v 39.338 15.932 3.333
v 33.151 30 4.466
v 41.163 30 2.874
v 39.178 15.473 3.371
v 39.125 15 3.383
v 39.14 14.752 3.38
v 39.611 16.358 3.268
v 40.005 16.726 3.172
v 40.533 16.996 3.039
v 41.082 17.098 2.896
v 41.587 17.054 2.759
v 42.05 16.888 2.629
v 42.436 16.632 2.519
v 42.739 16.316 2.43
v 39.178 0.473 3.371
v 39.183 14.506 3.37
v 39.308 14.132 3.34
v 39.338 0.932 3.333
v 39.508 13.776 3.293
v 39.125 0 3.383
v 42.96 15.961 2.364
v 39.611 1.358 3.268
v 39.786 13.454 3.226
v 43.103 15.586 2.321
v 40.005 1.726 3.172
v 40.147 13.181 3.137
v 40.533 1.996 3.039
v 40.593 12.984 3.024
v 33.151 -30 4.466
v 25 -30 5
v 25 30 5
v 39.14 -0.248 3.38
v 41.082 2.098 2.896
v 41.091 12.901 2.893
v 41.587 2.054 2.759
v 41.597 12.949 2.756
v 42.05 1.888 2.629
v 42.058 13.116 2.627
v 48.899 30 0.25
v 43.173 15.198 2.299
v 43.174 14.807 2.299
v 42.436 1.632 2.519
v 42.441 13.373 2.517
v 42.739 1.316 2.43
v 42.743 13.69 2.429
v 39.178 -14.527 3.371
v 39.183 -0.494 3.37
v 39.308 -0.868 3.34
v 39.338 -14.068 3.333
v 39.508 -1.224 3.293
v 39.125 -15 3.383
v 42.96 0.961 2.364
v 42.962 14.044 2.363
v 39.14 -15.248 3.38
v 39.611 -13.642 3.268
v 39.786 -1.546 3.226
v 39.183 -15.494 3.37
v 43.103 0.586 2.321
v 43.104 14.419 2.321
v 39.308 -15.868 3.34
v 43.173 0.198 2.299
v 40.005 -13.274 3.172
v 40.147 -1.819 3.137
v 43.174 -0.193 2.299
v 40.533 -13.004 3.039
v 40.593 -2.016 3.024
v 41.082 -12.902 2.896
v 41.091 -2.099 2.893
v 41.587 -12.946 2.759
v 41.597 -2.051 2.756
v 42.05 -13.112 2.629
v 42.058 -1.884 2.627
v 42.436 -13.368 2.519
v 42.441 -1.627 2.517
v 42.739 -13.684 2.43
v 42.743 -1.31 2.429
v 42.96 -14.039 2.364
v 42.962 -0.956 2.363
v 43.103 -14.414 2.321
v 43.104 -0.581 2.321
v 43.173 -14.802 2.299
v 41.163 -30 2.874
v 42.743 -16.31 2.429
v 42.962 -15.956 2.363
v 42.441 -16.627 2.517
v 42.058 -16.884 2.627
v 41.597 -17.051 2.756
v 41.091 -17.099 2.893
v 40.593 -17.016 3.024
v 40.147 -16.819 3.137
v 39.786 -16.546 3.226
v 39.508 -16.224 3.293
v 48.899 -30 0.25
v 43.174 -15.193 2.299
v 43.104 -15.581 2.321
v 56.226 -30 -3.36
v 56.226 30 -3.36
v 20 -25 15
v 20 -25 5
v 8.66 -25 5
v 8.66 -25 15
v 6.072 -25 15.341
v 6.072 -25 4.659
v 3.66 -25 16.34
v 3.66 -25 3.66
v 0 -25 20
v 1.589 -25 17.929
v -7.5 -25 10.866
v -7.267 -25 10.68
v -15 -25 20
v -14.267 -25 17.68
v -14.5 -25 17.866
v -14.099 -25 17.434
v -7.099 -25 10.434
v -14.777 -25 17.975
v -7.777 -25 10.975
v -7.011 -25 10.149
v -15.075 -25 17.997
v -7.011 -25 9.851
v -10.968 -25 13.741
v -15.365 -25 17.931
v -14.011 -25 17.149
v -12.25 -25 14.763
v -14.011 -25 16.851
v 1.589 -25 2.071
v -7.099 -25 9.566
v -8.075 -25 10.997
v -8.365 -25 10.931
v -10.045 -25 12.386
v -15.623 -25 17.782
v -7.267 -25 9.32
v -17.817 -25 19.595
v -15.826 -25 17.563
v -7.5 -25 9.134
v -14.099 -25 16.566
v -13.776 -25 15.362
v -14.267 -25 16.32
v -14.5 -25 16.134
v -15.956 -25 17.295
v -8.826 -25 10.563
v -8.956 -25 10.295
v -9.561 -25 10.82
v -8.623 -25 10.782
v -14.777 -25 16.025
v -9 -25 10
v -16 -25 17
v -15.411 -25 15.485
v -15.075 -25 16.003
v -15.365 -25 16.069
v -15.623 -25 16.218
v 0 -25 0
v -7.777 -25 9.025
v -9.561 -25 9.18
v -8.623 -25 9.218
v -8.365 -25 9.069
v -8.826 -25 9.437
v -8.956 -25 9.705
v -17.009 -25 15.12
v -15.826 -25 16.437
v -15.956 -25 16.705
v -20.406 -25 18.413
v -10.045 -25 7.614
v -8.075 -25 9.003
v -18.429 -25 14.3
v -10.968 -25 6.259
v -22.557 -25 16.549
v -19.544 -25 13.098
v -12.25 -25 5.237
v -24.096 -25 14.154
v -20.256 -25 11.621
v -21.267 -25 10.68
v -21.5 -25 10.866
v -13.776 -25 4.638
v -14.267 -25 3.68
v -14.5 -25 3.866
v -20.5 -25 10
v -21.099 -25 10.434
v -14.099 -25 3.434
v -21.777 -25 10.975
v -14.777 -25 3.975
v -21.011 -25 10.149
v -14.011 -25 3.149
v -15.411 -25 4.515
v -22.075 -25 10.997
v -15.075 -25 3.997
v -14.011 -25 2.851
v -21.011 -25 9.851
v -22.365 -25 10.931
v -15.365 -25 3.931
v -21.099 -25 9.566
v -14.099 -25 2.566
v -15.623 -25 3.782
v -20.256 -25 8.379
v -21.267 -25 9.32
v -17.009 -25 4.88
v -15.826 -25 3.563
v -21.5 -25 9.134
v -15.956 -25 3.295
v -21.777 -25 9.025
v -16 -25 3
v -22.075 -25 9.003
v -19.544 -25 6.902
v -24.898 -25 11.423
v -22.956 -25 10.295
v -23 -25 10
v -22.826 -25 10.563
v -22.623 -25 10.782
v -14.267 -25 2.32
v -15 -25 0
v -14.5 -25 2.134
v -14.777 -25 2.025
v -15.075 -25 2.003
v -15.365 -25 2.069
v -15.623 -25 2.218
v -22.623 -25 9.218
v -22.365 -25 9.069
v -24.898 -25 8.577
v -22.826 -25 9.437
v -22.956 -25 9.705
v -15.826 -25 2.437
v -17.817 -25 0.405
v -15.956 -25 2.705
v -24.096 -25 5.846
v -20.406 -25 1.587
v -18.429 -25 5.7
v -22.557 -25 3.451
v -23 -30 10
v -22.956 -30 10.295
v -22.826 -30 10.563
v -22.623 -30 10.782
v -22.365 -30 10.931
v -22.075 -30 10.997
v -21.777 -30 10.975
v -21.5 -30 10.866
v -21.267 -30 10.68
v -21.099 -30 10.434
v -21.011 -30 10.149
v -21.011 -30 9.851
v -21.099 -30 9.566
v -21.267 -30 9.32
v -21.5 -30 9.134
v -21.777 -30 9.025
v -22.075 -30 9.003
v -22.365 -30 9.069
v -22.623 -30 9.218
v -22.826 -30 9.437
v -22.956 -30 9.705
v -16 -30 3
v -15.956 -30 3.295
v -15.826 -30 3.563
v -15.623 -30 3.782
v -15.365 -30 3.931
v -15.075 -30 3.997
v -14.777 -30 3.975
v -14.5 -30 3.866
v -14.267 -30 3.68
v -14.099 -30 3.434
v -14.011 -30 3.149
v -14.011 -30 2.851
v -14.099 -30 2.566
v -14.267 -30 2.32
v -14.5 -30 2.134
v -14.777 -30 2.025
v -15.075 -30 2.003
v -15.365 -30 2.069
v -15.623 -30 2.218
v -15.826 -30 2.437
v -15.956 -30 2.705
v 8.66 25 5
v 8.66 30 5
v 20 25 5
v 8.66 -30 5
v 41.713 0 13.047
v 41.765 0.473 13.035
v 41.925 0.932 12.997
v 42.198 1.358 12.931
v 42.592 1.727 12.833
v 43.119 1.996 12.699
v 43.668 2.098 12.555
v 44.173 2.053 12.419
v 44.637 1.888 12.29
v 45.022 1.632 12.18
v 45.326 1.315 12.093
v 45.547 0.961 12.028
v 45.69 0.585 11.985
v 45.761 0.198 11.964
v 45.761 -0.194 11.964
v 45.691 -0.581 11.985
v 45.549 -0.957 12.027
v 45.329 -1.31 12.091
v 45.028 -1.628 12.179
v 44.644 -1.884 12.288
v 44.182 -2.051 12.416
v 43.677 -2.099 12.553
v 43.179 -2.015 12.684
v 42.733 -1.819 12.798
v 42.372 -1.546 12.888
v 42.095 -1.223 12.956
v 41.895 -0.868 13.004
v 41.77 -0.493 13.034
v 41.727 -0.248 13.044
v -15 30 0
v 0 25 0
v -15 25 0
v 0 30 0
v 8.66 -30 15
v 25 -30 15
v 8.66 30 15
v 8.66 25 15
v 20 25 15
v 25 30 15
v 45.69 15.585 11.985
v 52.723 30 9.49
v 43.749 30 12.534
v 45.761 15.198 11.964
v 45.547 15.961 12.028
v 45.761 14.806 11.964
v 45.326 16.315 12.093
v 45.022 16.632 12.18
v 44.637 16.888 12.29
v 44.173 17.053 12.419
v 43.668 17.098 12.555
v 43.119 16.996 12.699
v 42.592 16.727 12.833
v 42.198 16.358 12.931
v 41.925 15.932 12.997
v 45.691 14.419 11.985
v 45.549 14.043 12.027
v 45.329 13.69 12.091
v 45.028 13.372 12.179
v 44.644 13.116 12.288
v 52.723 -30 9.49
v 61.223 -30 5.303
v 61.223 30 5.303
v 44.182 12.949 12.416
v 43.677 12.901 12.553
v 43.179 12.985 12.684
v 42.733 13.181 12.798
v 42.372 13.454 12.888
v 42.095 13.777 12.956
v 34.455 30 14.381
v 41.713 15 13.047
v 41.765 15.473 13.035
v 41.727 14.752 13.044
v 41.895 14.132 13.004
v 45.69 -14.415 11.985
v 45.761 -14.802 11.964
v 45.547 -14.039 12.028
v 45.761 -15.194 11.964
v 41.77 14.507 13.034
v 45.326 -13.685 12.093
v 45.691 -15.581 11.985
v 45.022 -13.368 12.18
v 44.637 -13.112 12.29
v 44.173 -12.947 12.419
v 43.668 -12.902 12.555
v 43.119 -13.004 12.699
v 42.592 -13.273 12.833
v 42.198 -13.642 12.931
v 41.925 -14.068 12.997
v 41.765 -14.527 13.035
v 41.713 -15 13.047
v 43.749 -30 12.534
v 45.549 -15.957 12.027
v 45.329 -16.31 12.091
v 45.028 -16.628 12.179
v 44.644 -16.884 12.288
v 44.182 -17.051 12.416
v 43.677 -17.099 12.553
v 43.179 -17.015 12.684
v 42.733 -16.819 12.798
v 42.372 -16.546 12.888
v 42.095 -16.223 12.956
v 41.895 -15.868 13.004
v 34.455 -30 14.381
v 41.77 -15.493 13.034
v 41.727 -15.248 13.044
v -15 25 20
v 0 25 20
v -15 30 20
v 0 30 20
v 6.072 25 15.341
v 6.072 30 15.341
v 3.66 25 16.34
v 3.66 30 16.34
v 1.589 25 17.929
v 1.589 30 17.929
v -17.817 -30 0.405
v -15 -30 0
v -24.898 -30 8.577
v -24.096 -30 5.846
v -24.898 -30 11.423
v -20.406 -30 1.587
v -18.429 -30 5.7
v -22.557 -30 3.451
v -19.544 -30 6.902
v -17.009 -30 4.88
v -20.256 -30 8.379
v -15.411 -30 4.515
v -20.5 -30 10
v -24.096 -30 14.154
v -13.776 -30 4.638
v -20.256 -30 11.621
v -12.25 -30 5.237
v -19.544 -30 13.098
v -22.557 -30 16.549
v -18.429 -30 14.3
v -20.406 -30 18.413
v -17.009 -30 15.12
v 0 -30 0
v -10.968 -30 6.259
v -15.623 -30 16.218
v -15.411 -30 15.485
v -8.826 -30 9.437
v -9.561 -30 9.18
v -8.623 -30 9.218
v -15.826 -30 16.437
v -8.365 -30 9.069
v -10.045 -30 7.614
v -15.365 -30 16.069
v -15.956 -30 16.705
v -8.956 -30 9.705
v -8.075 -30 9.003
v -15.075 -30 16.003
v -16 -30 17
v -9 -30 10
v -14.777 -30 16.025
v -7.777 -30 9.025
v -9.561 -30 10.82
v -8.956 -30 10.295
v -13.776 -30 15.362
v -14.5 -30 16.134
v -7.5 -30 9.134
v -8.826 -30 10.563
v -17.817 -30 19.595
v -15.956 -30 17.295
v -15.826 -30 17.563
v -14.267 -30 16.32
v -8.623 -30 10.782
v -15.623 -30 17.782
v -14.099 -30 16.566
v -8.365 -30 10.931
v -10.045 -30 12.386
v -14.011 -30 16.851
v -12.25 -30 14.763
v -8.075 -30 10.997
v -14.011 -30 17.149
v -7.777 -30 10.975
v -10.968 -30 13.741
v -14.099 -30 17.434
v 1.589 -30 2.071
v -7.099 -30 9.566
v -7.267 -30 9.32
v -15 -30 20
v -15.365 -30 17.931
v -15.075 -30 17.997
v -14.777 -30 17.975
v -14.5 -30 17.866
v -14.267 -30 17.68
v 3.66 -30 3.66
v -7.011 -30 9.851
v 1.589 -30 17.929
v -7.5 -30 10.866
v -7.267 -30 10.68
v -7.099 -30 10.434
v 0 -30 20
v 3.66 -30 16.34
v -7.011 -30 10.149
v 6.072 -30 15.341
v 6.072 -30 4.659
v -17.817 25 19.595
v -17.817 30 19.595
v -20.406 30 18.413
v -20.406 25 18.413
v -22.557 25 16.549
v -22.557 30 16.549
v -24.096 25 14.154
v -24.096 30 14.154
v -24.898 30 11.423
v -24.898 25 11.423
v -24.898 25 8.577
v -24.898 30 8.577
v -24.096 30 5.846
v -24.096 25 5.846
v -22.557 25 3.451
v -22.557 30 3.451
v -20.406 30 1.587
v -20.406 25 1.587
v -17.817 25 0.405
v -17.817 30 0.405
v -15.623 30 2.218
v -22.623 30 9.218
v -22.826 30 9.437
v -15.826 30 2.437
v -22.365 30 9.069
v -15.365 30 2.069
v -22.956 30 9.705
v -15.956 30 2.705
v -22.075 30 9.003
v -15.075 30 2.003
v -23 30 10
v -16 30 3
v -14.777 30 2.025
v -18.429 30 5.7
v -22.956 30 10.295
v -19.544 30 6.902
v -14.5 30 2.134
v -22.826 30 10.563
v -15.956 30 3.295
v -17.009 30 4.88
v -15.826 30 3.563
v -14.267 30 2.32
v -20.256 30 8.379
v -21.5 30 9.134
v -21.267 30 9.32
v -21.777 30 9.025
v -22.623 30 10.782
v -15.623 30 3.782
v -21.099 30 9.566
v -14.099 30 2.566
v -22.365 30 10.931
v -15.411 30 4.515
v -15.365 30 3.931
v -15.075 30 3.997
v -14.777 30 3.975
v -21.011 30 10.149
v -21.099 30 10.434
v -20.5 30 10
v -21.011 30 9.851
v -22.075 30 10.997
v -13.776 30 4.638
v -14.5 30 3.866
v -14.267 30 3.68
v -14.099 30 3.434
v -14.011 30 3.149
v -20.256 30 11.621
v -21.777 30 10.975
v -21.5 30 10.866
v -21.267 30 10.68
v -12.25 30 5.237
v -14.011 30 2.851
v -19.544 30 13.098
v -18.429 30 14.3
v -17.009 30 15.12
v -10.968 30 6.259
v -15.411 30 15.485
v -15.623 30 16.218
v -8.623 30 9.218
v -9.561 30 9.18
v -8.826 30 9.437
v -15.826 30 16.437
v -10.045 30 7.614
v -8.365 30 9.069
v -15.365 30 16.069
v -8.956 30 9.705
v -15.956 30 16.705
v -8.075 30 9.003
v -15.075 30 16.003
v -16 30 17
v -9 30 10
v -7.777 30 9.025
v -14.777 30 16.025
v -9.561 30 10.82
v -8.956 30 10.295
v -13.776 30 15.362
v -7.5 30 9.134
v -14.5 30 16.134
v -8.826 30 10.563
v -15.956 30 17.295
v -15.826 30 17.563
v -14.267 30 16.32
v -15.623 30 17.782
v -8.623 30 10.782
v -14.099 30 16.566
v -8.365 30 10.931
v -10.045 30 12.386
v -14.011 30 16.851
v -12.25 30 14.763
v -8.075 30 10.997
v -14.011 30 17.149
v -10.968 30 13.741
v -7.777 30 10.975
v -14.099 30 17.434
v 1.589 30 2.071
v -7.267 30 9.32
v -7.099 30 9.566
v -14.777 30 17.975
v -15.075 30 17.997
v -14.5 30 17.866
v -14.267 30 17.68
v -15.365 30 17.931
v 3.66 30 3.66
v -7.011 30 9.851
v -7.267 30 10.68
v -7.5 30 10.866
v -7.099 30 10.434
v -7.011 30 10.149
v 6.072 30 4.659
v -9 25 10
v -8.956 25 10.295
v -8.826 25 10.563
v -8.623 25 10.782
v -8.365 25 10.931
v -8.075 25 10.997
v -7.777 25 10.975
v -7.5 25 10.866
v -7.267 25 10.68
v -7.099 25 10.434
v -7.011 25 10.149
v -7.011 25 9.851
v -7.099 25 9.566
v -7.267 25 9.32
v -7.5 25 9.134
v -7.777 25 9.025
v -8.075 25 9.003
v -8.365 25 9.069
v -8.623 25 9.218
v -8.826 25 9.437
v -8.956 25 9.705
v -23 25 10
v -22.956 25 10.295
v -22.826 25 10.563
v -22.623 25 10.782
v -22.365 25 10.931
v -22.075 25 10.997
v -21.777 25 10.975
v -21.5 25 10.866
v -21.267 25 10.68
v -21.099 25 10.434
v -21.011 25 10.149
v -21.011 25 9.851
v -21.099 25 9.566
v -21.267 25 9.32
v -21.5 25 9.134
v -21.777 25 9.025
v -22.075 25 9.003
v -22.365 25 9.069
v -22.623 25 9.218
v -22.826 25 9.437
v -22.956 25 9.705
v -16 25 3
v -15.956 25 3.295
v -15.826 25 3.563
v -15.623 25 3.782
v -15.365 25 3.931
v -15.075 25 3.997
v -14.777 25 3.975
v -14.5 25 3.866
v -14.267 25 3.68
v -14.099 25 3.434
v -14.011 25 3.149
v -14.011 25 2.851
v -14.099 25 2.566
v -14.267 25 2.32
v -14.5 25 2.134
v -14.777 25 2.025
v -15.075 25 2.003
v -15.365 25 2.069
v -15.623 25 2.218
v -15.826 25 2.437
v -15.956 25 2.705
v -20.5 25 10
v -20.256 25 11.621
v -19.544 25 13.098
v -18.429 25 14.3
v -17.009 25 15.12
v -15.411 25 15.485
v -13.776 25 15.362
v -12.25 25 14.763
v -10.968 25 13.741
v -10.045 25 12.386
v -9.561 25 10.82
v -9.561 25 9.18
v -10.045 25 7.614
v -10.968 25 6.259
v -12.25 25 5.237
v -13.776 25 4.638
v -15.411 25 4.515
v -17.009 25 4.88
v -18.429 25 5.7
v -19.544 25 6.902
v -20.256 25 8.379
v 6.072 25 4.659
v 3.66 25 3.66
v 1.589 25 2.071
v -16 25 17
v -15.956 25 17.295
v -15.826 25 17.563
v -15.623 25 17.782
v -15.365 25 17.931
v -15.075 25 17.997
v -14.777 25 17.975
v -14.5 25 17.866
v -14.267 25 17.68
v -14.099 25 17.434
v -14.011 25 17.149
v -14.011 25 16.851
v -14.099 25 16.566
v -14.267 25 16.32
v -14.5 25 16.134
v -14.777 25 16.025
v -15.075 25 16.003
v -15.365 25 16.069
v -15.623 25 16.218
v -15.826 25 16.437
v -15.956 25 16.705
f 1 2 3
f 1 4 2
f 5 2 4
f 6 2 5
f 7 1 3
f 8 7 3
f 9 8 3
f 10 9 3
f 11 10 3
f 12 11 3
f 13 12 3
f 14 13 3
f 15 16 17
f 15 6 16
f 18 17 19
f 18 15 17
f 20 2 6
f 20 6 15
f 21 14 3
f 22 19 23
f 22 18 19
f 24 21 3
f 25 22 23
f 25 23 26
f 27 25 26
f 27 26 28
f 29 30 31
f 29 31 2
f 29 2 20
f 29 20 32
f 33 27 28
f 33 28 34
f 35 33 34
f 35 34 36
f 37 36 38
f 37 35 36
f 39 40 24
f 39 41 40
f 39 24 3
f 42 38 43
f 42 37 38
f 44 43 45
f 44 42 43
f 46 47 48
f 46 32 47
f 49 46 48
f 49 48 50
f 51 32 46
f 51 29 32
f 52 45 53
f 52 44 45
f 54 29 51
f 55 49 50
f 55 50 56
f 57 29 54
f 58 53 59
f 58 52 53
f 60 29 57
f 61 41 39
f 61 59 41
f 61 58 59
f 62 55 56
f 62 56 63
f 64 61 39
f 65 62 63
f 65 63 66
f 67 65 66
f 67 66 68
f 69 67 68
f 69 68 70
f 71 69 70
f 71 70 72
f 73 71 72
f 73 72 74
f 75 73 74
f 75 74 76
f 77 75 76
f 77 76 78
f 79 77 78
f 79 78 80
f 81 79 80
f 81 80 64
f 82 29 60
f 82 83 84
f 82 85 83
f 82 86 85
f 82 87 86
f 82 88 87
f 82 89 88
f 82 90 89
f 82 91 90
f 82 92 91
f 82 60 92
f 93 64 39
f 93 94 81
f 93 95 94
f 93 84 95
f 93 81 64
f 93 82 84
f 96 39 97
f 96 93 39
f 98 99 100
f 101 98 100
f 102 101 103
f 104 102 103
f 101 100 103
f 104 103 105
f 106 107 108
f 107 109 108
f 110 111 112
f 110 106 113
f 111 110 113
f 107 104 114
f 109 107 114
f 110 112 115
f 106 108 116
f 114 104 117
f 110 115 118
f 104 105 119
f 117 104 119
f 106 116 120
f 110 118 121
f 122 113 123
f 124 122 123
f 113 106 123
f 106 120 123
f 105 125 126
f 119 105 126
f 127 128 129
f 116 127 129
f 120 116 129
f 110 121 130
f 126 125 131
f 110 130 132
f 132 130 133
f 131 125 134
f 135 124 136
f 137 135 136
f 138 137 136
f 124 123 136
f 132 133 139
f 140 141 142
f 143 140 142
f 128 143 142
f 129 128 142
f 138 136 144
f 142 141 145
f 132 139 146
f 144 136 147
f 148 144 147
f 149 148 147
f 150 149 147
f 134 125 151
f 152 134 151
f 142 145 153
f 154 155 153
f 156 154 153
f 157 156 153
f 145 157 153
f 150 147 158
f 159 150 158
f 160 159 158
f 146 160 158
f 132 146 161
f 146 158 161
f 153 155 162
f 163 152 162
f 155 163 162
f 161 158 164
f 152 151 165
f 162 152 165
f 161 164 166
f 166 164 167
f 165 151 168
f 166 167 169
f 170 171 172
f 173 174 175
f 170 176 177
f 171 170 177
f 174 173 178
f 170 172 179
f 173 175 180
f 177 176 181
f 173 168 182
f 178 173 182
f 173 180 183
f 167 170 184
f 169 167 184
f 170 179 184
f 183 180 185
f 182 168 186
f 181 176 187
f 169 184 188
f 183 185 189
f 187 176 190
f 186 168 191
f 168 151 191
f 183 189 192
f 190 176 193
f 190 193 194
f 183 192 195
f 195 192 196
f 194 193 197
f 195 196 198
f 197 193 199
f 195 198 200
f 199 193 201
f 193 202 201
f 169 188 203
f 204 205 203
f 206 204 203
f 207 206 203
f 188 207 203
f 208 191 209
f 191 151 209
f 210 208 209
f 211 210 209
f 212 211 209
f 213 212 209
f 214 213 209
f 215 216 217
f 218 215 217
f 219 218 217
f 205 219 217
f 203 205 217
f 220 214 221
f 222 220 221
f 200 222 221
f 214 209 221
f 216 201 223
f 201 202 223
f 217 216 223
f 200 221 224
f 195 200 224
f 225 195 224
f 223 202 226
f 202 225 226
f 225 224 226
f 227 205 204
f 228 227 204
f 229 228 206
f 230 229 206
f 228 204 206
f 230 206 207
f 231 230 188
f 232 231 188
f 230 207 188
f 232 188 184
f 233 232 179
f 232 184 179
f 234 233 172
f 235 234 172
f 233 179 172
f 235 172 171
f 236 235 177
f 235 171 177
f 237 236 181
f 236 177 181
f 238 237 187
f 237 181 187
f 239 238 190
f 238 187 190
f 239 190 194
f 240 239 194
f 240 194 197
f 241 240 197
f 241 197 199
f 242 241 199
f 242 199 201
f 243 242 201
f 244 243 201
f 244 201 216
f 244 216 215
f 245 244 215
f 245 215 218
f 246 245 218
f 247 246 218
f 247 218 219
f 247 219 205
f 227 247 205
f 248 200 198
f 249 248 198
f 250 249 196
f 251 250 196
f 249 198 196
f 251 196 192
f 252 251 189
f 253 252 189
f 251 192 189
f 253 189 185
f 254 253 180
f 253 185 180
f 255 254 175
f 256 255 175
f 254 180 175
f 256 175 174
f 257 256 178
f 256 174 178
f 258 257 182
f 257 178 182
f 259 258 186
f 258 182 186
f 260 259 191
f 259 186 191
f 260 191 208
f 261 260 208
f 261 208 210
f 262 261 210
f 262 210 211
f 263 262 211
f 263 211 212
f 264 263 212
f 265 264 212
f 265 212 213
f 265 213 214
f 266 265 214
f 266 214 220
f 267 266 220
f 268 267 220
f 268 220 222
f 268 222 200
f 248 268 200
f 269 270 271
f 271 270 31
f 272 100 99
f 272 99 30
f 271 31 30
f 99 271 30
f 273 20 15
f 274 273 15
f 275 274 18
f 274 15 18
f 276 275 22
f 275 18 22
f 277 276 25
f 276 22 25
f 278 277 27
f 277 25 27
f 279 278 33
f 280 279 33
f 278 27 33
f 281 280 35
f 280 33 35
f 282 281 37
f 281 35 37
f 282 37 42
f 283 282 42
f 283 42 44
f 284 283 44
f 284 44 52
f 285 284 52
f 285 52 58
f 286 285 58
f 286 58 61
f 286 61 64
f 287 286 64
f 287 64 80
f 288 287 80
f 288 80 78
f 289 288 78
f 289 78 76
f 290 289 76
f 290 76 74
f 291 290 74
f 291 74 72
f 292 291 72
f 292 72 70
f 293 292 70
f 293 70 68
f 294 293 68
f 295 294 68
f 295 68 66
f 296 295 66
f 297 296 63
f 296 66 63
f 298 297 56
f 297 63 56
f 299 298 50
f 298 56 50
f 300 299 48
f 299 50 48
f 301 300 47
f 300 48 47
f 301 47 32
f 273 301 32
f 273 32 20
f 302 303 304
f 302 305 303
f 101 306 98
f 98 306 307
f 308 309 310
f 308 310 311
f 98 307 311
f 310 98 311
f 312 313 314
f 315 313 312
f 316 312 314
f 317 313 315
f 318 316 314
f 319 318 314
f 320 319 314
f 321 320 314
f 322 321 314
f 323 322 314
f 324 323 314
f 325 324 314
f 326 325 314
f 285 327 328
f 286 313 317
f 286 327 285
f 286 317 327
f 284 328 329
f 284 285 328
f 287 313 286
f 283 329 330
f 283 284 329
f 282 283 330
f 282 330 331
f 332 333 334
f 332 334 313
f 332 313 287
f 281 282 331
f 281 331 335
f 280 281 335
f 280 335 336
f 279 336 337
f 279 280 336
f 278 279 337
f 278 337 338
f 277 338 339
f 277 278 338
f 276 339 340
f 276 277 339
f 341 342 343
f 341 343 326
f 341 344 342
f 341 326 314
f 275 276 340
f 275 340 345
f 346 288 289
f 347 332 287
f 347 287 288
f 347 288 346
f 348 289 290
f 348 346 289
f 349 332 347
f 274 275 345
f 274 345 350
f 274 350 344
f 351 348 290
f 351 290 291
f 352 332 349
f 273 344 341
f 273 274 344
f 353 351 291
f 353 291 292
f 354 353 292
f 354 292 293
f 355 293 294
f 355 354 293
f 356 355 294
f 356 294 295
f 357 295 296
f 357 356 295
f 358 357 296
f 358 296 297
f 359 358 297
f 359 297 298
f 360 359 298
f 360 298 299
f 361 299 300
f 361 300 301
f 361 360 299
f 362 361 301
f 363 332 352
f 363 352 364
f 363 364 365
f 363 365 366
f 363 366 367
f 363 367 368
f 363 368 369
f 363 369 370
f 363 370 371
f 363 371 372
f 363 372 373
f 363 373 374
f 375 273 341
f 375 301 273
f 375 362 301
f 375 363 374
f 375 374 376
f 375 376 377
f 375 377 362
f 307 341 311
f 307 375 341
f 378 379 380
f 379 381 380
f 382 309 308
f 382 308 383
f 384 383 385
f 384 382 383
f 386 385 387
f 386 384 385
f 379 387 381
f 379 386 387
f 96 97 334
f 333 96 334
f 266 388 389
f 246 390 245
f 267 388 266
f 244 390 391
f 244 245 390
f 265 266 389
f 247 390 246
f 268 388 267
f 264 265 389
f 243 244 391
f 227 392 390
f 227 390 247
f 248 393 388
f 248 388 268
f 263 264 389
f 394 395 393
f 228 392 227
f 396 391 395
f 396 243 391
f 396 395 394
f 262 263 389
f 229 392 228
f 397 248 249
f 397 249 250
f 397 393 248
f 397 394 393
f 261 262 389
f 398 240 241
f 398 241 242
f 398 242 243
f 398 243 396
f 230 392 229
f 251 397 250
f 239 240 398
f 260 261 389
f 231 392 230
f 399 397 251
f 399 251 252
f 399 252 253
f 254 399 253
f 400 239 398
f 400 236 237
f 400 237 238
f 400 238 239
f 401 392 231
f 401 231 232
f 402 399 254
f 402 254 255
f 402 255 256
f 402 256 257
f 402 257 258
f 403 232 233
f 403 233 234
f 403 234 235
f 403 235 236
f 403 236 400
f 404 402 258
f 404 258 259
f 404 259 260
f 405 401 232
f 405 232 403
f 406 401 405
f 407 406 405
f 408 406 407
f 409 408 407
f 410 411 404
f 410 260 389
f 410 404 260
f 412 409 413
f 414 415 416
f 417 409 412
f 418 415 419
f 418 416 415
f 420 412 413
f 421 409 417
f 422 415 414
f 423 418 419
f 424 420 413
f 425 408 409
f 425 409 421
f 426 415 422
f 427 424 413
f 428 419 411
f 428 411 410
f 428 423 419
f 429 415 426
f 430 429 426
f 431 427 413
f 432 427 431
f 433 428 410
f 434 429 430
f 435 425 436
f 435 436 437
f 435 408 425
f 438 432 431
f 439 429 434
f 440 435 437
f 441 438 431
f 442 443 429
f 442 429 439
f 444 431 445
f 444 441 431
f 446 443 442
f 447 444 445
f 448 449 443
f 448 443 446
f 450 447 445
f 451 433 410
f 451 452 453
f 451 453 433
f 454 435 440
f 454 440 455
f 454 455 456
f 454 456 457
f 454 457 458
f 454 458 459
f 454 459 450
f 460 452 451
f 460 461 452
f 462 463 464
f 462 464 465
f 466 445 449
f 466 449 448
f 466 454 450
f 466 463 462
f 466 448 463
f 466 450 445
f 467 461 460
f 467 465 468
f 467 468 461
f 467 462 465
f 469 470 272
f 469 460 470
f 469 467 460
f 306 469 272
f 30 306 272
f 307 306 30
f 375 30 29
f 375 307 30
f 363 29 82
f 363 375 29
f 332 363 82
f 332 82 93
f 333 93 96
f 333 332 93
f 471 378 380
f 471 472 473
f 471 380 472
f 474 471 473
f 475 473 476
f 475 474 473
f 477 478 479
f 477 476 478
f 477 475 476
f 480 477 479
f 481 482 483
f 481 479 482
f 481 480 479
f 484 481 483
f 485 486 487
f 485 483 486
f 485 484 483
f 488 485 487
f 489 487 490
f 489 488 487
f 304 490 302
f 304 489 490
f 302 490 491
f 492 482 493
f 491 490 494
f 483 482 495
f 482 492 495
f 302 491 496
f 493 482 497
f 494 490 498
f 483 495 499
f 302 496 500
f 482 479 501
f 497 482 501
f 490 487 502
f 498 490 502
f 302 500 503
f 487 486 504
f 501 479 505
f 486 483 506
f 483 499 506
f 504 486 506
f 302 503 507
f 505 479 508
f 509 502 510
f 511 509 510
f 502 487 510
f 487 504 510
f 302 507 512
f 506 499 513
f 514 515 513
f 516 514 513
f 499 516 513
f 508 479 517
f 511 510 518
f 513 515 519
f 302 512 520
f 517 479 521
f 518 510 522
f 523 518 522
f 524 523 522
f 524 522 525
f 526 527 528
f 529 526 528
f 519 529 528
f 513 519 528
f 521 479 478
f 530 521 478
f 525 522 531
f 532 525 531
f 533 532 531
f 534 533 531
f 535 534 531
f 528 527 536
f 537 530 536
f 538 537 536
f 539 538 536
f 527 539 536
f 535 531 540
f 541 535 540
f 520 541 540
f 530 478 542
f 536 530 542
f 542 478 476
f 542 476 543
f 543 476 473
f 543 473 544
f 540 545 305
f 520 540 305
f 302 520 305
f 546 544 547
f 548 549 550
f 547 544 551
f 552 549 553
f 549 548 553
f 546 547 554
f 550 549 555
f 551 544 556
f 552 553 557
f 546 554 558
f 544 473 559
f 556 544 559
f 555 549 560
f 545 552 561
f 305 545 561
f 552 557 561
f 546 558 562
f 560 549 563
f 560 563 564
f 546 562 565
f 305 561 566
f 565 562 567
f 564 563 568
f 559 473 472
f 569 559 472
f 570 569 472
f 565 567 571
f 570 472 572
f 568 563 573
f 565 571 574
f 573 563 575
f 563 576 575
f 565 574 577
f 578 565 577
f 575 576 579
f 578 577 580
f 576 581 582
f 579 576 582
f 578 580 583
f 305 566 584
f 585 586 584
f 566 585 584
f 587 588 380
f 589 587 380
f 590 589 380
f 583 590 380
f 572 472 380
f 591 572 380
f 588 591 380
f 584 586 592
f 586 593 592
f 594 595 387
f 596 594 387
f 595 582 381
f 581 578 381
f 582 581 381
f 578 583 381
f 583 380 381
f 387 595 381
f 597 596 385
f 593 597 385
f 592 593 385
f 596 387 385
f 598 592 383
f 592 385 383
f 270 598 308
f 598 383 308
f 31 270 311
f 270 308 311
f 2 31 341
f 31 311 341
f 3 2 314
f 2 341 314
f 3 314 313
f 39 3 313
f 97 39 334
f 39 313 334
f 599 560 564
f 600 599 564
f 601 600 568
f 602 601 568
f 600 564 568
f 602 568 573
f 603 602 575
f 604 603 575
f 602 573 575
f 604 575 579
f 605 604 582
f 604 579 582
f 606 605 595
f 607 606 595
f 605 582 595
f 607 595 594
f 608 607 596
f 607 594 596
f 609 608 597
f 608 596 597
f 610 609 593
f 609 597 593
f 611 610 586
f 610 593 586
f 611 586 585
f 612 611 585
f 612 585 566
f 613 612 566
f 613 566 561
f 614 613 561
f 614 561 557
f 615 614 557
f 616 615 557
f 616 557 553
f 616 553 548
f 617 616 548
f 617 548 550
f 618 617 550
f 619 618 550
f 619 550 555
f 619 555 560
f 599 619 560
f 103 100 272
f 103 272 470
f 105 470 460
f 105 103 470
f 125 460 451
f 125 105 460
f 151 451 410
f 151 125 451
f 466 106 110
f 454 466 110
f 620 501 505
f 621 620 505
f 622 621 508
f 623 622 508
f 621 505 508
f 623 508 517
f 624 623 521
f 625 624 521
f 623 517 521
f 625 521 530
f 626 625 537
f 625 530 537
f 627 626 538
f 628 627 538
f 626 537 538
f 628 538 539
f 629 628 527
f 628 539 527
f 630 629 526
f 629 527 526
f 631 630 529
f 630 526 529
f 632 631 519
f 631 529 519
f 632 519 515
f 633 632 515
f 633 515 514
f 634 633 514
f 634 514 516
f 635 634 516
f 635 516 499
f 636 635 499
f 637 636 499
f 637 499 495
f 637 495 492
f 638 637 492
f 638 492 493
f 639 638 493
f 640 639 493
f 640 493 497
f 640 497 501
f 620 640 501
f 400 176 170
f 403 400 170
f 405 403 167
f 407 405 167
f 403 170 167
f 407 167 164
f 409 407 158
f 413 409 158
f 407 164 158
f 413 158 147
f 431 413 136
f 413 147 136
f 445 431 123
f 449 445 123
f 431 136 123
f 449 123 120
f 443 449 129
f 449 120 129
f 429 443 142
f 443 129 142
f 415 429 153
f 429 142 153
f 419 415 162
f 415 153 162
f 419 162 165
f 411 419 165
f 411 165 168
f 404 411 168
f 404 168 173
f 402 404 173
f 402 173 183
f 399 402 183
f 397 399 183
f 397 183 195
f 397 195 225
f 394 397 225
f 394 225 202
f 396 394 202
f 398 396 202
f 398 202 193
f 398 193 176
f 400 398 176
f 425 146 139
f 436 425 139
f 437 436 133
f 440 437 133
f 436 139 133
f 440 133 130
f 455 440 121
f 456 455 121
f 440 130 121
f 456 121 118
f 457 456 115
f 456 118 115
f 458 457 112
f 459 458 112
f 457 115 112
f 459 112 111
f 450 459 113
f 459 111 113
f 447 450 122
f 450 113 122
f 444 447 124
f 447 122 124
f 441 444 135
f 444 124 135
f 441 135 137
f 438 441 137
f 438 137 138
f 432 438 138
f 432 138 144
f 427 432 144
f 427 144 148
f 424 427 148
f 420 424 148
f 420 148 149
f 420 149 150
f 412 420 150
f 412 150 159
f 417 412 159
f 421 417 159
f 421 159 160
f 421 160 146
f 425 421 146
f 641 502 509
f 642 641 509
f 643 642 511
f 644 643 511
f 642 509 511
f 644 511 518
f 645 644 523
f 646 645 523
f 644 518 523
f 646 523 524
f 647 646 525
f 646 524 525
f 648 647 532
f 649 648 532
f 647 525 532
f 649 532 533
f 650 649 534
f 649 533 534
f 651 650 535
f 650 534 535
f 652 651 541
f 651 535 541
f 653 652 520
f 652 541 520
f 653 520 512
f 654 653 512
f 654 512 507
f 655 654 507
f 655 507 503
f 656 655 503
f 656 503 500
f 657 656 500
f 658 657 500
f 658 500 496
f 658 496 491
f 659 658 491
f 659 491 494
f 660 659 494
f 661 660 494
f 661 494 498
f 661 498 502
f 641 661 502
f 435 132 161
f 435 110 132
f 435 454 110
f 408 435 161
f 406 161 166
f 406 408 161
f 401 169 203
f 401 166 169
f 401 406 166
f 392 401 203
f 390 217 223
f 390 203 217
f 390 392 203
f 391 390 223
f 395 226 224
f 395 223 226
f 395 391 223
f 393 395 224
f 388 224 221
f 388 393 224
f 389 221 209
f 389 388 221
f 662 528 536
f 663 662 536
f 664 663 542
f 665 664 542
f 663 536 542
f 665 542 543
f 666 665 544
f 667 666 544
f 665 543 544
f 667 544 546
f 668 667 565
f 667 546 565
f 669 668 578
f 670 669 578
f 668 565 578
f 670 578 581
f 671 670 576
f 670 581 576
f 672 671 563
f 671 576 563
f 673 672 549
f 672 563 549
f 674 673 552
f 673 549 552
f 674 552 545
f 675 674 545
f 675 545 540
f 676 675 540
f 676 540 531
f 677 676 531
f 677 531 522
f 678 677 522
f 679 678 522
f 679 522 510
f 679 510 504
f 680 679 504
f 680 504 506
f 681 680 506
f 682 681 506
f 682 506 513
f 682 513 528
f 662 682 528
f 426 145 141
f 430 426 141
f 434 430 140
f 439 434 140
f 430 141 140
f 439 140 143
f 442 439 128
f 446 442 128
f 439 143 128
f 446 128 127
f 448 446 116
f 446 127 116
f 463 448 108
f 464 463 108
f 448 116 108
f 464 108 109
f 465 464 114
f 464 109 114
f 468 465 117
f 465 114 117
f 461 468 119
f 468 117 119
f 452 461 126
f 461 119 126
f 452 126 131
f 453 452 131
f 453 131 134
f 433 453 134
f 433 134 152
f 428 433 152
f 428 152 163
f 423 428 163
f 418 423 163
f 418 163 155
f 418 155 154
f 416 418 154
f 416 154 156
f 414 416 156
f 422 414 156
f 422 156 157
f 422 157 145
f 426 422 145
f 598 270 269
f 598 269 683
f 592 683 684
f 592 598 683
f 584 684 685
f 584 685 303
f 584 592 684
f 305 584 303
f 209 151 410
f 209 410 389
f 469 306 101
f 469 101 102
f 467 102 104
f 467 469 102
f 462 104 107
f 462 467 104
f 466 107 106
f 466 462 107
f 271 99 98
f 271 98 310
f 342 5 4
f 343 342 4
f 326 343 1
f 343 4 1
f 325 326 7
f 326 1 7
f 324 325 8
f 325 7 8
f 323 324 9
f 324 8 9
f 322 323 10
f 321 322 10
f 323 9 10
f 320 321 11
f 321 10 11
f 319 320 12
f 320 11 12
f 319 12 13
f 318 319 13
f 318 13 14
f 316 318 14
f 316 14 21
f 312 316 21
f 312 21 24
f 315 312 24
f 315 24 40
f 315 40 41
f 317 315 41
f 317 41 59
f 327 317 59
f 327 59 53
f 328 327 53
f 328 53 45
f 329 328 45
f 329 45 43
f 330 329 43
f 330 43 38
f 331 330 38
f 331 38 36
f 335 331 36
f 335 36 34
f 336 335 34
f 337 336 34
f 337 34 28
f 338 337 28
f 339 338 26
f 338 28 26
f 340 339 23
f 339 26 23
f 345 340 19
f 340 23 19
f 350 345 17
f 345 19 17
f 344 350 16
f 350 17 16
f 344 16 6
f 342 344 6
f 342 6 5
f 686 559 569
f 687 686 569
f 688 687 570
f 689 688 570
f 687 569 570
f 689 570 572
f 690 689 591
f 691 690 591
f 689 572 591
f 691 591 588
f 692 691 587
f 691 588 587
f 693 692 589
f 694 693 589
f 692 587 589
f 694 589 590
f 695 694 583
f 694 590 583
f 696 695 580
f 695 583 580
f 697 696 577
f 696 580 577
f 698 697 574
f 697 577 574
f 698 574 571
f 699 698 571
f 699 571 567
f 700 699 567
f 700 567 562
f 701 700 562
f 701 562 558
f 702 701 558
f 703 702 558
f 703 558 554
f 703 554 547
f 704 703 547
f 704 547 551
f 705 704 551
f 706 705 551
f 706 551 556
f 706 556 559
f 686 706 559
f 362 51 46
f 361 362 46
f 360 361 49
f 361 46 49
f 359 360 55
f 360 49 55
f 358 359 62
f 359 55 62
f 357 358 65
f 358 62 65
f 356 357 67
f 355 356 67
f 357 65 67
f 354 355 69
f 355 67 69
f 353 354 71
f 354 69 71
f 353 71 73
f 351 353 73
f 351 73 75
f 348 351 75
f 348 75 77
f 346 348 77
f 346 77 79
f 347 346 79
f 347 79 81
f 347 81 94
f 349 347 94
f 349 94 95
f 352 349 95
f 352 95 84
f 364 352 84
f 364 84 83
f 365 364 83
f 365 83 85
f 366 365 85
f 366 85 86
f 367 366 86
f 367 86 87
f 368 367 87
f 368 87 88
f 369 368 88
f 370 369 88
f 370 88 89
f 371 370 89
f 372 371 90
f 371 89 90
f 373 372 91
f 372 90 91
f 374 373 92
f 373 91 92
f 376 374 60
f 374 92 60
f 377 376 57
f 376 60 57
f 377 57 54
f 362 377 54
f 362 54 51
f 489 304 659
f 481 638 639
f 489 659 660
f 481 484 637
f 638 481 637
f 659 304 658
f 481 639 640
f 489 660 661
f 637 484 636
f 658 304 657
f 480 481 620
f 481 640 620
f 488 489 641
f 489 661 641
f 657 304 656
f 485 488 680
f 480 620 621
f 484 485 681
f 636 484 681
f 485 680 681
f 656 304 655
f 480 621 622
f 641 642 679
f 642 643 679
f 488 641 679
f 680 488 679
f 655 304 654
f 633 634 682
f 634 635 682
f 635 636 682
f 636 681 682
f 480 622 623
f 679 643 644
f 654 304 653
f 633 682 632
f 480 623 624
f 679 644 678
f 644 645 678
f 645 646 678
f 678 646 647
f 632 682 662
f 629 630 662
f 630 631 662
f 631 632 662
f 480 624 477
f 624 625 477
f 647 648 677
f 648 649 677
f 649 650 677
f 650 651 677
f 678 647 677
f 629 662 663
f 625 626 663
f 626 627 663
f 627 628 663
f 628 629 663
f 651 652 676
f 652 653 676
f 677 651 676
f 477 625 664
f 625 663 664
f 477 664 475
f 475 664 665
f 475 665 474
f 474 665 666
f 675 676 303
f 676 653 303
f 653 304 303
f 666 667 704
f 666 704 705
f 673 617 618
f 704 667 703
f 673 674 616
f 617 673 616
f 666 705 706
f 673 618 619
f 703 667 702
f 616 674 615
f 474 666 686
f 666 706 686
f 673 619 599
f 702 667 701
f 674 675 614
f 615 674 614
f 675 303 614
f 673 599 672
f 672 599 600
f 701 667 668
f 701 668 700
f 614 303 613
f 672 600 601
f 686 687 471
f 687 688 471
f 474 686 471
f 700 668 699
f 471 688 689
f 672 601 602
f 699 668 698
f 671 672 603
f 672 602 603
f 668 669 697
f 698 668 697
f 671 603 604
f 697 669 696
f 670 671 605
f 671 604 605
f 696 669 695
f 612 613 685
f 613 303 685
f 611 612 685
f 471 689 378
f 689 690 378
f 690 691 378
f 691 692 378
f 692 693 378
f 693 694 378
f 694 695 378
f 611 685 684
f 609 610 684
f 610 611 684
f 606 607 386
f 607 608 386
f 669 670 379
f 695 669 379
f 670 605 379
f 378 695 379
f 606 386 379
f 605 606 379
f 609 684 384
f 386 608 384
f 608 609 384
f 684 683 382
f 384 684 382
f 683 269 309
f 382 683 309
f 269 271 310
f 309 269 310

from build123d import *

# Parameters (mm, degrees)
BOSS_EXTRUDE2_DEPTH = 20
FILLET1_RADIUS      = 10
FILLET1_LENGTH      = 5
FILLET2_RADIUS      = 10
FILLET2_LENGTH      = 5
SKETCH5_R           = 1
SKETCH5_R_2         = 5.5
CUT_EXTRUDE5_DEPTH  = 69.007352544
CUT_EXTRUDE7_DEPTH  = 25
FILLET5_R           = 10
BOSS_EXTRUDE5_DEPTH = 60
SKETCH13_R          = 2.1
CUT_EXTRUDE8_DEPTH  = 60


with BuildPart() as part:
    # Sketch1 → Boss-Extrude2 (new body)
    with BuildSketch(Plane.XY):
        Polygon((-25, 30), (25, 30), (25, -30), (-25, -30), (-25, -25), (-20, -25), (20, -25), (20, 25), (-20, 25), (-25, 25), align=None)
    extrude(amount=BOSS_EXTRUDE2_DEPTH)

    # Fillet1: full round fillet: the end face becomes a half cylinder, R = half its width
    fillet1_face = Plane((-25, 27.5, 10), x_dir=(0, -1, 0), z_dir=(-1, 0, 0))  # on the end face: x along it, z out of the body
    fillet1_slab = fillet1_face.offset(-FILLET1_RADIUS / 2) * Box(FILLET1_LENGTH, 2 * FILLET1_RADIUS, FILLET1_RADIUS, mode=Mode.PRIVATE)  # the body's end, R deep
    fillet1_round = Plane((-15, 27.5, 10), x_dir=(-1, 0, 0), z_dir=(0, -1, 0)) * Cylinder(FILLET1_RADIUS, FILLET1_LENGTH, mode=Mode.PRIVATE)  # its axis R under the face
    add(fillet1_slab - fillet1_round, mode=Mode.SUBTRACT)

    # Fillet2: full round fillet: the end face becomes a half cylinder, R = half its width
    fillet2_face = Plane((-25, -27.5, 10), x_dir=(0, -1, 0), z_dir=(-1, 0, 0))  # on the end face: x along it, z out of the body
    fillet2_slab = fillet2_face.offset(-FILLET2_RADIUS / 2) * Box(FILLET2_LENGTH, 2 * FILLET2_RADIUS, FILLET2_RADIUS, mode=Mode.PRIVATE)  # the body's end, R deep
    fillet2_round = Plane((-15, -27.5, 10), x_dir=(-1, 0, 0), z_dir=(0, -1, 0)) * Cylinder(FILLET2_RADIUS, FILLET2_LENGTH, mode=Mode.PRIVATE)  # its axis R under the face
    add(fillet2_slab - fillet2_round, mode=Mode.SUBTRACT)

    # Sketch5 → Cut-Extrude5 (cut, through all)
    with BuildSketch(Plane(origin=(0, 30, 0), x_dir=(1, 0, 0), z_dir=(0, 1, 0))):
        with Locations(Location((-15, -3, 0), (0, 0, 180))):
            Circle(SKETCH5_R)
        with Locations(Location((-22, -10, 0), (0, 0, 180))):
            Circle(SKETCH5_R)
        with Locations(Location((-15, -17, 0), (0, 0, 180))):
            Circle(SKETCH5_R)
        with Locations(Location((-8, -10, 0), (0, 0, 180))):
            Circle(SKETCH5_R)
        with Locations(Location((-15, -10, 0), (0, 0, 180))):
            Circle(SKETCH5_R_2)
    extrude(amount=-CUT_EXTRUDE5_DEPTH, mode=Mode.SUBTRACT)

    # Sketch10 → Cut-Extrude7 (cut)
    with BuildSketch(Plane(origin=(25, 0, 0), x_dir=(0, 0, -1), z_dir=(1, 0, 0))):
        Polygon((-15, 28.180148829), (-15, -28.180148829), (-15, -30), (-20, -30), (-20, 30), (-15, 30), align=None)
        Polygon((-5, 28.180148829), (-5, -28.180148829), (-5, -30), (0, -30), (0, 30), (-5, 30), align=None)
    extrude(amount=-CUT_EXTRUDE7_DEPTH, mode=Mode.SUBTRACT)

    # Fillet5
    # the kernel refuses this fillet: 10 mm, written as the material it adds along each edge
    with BuildSketch(Plane(origin=(0, 25, 15), x_dir=(1, 0, 0), z_dir=(0, 1, 0)), Plane(origin=(0, -30, 15), x_dir=(1, 0, 0), z_dir=(0, 1, 0)), Plane(origin=(0, -25, 5), x_dir=(1, 0, 0), z_dir=(0, -1, 0))) as fillet5_piece_1:
        with BuildLine():
            CenterArc((8.660254038, -10), FILLET5_R, 90, 60)
            Line((0, -5), (-0.173205081, -4.9))
            ThreePointArc((-0.173205081, -4.9), (-0.2, -2.5), (-0.2, 0))
            Line((-0.2, 0), (0, 0.2))
            Line((0, 0.2), (8.660254038, 0.2))
            Line((8.660254038, 0.2), (8.660254038, 0))
        make_face()
    extrude(amount=5)
    with BuildSketch(Plane(origin=(0, 30, 5), x_dir=(0, 0, -1), z_dir=(0, -1, 0))) as fillet5_piece_2:
        with BuildLine():
            CenterArc((10, 8.660254038), FILLET5_R, 180, 60)
            Line((0, 8.660254038), (-0.2, 8.660254038))
            Line((-0.2, 8.660254038), (-0.2, 0))
            Line((-0.2, 0), (0, -0.2))
            ThreePointArc((0, -0.2), (2.5, -0.2), (4.9, -0.173205081))
            Line((4.9, -0.173205081), (5, 0))
        make_face()
    extrude(amount=5)

    # Sketch12 → Boss-Extrude5 (add)
    with BuildSketch(Plane.XZ.offset(30)):
        with BuildLine():
            Line((56.226298398, -3.359735054), (61.222506141, 5.302707337))
            ThreePointArc((61.222506141, 5.302707337), (43.74904955, 12.533728595), (25, 15))
            Line((25, 15), (25, 5))
            ThreePointArc((25, 5), (41.16297375, 2.873903962), (56.226298398, -3.359735054))
        make_face()
    extrude(amount=-BOSS_EXTRUDE5_DEPTH)

    # Sketch13 → Cut-Extrude8 (cut)
    with BuildSketch(Plane(origin=(2.920998947, 0, 10.910870277), x_dir=(-0.9659824633840055, 0, 0.2586075800021504), z_dir=(-0.2586075800021504, 0, -0.9659824633840055))):
        with Locations((-39.019497435, 15)):
            Circle(SKETCH13_R)
        with Locations((-39.019497435, 0)):
            Circle(SKETCH13_R)
        with Locations((-39.019497435, -15)):
            Circle(SKETCH13_R)
    extrude(amount=-CUT_EXTRUDE8_DEPTH, mode=Mode.SUBTRACT)


solid = part.part
